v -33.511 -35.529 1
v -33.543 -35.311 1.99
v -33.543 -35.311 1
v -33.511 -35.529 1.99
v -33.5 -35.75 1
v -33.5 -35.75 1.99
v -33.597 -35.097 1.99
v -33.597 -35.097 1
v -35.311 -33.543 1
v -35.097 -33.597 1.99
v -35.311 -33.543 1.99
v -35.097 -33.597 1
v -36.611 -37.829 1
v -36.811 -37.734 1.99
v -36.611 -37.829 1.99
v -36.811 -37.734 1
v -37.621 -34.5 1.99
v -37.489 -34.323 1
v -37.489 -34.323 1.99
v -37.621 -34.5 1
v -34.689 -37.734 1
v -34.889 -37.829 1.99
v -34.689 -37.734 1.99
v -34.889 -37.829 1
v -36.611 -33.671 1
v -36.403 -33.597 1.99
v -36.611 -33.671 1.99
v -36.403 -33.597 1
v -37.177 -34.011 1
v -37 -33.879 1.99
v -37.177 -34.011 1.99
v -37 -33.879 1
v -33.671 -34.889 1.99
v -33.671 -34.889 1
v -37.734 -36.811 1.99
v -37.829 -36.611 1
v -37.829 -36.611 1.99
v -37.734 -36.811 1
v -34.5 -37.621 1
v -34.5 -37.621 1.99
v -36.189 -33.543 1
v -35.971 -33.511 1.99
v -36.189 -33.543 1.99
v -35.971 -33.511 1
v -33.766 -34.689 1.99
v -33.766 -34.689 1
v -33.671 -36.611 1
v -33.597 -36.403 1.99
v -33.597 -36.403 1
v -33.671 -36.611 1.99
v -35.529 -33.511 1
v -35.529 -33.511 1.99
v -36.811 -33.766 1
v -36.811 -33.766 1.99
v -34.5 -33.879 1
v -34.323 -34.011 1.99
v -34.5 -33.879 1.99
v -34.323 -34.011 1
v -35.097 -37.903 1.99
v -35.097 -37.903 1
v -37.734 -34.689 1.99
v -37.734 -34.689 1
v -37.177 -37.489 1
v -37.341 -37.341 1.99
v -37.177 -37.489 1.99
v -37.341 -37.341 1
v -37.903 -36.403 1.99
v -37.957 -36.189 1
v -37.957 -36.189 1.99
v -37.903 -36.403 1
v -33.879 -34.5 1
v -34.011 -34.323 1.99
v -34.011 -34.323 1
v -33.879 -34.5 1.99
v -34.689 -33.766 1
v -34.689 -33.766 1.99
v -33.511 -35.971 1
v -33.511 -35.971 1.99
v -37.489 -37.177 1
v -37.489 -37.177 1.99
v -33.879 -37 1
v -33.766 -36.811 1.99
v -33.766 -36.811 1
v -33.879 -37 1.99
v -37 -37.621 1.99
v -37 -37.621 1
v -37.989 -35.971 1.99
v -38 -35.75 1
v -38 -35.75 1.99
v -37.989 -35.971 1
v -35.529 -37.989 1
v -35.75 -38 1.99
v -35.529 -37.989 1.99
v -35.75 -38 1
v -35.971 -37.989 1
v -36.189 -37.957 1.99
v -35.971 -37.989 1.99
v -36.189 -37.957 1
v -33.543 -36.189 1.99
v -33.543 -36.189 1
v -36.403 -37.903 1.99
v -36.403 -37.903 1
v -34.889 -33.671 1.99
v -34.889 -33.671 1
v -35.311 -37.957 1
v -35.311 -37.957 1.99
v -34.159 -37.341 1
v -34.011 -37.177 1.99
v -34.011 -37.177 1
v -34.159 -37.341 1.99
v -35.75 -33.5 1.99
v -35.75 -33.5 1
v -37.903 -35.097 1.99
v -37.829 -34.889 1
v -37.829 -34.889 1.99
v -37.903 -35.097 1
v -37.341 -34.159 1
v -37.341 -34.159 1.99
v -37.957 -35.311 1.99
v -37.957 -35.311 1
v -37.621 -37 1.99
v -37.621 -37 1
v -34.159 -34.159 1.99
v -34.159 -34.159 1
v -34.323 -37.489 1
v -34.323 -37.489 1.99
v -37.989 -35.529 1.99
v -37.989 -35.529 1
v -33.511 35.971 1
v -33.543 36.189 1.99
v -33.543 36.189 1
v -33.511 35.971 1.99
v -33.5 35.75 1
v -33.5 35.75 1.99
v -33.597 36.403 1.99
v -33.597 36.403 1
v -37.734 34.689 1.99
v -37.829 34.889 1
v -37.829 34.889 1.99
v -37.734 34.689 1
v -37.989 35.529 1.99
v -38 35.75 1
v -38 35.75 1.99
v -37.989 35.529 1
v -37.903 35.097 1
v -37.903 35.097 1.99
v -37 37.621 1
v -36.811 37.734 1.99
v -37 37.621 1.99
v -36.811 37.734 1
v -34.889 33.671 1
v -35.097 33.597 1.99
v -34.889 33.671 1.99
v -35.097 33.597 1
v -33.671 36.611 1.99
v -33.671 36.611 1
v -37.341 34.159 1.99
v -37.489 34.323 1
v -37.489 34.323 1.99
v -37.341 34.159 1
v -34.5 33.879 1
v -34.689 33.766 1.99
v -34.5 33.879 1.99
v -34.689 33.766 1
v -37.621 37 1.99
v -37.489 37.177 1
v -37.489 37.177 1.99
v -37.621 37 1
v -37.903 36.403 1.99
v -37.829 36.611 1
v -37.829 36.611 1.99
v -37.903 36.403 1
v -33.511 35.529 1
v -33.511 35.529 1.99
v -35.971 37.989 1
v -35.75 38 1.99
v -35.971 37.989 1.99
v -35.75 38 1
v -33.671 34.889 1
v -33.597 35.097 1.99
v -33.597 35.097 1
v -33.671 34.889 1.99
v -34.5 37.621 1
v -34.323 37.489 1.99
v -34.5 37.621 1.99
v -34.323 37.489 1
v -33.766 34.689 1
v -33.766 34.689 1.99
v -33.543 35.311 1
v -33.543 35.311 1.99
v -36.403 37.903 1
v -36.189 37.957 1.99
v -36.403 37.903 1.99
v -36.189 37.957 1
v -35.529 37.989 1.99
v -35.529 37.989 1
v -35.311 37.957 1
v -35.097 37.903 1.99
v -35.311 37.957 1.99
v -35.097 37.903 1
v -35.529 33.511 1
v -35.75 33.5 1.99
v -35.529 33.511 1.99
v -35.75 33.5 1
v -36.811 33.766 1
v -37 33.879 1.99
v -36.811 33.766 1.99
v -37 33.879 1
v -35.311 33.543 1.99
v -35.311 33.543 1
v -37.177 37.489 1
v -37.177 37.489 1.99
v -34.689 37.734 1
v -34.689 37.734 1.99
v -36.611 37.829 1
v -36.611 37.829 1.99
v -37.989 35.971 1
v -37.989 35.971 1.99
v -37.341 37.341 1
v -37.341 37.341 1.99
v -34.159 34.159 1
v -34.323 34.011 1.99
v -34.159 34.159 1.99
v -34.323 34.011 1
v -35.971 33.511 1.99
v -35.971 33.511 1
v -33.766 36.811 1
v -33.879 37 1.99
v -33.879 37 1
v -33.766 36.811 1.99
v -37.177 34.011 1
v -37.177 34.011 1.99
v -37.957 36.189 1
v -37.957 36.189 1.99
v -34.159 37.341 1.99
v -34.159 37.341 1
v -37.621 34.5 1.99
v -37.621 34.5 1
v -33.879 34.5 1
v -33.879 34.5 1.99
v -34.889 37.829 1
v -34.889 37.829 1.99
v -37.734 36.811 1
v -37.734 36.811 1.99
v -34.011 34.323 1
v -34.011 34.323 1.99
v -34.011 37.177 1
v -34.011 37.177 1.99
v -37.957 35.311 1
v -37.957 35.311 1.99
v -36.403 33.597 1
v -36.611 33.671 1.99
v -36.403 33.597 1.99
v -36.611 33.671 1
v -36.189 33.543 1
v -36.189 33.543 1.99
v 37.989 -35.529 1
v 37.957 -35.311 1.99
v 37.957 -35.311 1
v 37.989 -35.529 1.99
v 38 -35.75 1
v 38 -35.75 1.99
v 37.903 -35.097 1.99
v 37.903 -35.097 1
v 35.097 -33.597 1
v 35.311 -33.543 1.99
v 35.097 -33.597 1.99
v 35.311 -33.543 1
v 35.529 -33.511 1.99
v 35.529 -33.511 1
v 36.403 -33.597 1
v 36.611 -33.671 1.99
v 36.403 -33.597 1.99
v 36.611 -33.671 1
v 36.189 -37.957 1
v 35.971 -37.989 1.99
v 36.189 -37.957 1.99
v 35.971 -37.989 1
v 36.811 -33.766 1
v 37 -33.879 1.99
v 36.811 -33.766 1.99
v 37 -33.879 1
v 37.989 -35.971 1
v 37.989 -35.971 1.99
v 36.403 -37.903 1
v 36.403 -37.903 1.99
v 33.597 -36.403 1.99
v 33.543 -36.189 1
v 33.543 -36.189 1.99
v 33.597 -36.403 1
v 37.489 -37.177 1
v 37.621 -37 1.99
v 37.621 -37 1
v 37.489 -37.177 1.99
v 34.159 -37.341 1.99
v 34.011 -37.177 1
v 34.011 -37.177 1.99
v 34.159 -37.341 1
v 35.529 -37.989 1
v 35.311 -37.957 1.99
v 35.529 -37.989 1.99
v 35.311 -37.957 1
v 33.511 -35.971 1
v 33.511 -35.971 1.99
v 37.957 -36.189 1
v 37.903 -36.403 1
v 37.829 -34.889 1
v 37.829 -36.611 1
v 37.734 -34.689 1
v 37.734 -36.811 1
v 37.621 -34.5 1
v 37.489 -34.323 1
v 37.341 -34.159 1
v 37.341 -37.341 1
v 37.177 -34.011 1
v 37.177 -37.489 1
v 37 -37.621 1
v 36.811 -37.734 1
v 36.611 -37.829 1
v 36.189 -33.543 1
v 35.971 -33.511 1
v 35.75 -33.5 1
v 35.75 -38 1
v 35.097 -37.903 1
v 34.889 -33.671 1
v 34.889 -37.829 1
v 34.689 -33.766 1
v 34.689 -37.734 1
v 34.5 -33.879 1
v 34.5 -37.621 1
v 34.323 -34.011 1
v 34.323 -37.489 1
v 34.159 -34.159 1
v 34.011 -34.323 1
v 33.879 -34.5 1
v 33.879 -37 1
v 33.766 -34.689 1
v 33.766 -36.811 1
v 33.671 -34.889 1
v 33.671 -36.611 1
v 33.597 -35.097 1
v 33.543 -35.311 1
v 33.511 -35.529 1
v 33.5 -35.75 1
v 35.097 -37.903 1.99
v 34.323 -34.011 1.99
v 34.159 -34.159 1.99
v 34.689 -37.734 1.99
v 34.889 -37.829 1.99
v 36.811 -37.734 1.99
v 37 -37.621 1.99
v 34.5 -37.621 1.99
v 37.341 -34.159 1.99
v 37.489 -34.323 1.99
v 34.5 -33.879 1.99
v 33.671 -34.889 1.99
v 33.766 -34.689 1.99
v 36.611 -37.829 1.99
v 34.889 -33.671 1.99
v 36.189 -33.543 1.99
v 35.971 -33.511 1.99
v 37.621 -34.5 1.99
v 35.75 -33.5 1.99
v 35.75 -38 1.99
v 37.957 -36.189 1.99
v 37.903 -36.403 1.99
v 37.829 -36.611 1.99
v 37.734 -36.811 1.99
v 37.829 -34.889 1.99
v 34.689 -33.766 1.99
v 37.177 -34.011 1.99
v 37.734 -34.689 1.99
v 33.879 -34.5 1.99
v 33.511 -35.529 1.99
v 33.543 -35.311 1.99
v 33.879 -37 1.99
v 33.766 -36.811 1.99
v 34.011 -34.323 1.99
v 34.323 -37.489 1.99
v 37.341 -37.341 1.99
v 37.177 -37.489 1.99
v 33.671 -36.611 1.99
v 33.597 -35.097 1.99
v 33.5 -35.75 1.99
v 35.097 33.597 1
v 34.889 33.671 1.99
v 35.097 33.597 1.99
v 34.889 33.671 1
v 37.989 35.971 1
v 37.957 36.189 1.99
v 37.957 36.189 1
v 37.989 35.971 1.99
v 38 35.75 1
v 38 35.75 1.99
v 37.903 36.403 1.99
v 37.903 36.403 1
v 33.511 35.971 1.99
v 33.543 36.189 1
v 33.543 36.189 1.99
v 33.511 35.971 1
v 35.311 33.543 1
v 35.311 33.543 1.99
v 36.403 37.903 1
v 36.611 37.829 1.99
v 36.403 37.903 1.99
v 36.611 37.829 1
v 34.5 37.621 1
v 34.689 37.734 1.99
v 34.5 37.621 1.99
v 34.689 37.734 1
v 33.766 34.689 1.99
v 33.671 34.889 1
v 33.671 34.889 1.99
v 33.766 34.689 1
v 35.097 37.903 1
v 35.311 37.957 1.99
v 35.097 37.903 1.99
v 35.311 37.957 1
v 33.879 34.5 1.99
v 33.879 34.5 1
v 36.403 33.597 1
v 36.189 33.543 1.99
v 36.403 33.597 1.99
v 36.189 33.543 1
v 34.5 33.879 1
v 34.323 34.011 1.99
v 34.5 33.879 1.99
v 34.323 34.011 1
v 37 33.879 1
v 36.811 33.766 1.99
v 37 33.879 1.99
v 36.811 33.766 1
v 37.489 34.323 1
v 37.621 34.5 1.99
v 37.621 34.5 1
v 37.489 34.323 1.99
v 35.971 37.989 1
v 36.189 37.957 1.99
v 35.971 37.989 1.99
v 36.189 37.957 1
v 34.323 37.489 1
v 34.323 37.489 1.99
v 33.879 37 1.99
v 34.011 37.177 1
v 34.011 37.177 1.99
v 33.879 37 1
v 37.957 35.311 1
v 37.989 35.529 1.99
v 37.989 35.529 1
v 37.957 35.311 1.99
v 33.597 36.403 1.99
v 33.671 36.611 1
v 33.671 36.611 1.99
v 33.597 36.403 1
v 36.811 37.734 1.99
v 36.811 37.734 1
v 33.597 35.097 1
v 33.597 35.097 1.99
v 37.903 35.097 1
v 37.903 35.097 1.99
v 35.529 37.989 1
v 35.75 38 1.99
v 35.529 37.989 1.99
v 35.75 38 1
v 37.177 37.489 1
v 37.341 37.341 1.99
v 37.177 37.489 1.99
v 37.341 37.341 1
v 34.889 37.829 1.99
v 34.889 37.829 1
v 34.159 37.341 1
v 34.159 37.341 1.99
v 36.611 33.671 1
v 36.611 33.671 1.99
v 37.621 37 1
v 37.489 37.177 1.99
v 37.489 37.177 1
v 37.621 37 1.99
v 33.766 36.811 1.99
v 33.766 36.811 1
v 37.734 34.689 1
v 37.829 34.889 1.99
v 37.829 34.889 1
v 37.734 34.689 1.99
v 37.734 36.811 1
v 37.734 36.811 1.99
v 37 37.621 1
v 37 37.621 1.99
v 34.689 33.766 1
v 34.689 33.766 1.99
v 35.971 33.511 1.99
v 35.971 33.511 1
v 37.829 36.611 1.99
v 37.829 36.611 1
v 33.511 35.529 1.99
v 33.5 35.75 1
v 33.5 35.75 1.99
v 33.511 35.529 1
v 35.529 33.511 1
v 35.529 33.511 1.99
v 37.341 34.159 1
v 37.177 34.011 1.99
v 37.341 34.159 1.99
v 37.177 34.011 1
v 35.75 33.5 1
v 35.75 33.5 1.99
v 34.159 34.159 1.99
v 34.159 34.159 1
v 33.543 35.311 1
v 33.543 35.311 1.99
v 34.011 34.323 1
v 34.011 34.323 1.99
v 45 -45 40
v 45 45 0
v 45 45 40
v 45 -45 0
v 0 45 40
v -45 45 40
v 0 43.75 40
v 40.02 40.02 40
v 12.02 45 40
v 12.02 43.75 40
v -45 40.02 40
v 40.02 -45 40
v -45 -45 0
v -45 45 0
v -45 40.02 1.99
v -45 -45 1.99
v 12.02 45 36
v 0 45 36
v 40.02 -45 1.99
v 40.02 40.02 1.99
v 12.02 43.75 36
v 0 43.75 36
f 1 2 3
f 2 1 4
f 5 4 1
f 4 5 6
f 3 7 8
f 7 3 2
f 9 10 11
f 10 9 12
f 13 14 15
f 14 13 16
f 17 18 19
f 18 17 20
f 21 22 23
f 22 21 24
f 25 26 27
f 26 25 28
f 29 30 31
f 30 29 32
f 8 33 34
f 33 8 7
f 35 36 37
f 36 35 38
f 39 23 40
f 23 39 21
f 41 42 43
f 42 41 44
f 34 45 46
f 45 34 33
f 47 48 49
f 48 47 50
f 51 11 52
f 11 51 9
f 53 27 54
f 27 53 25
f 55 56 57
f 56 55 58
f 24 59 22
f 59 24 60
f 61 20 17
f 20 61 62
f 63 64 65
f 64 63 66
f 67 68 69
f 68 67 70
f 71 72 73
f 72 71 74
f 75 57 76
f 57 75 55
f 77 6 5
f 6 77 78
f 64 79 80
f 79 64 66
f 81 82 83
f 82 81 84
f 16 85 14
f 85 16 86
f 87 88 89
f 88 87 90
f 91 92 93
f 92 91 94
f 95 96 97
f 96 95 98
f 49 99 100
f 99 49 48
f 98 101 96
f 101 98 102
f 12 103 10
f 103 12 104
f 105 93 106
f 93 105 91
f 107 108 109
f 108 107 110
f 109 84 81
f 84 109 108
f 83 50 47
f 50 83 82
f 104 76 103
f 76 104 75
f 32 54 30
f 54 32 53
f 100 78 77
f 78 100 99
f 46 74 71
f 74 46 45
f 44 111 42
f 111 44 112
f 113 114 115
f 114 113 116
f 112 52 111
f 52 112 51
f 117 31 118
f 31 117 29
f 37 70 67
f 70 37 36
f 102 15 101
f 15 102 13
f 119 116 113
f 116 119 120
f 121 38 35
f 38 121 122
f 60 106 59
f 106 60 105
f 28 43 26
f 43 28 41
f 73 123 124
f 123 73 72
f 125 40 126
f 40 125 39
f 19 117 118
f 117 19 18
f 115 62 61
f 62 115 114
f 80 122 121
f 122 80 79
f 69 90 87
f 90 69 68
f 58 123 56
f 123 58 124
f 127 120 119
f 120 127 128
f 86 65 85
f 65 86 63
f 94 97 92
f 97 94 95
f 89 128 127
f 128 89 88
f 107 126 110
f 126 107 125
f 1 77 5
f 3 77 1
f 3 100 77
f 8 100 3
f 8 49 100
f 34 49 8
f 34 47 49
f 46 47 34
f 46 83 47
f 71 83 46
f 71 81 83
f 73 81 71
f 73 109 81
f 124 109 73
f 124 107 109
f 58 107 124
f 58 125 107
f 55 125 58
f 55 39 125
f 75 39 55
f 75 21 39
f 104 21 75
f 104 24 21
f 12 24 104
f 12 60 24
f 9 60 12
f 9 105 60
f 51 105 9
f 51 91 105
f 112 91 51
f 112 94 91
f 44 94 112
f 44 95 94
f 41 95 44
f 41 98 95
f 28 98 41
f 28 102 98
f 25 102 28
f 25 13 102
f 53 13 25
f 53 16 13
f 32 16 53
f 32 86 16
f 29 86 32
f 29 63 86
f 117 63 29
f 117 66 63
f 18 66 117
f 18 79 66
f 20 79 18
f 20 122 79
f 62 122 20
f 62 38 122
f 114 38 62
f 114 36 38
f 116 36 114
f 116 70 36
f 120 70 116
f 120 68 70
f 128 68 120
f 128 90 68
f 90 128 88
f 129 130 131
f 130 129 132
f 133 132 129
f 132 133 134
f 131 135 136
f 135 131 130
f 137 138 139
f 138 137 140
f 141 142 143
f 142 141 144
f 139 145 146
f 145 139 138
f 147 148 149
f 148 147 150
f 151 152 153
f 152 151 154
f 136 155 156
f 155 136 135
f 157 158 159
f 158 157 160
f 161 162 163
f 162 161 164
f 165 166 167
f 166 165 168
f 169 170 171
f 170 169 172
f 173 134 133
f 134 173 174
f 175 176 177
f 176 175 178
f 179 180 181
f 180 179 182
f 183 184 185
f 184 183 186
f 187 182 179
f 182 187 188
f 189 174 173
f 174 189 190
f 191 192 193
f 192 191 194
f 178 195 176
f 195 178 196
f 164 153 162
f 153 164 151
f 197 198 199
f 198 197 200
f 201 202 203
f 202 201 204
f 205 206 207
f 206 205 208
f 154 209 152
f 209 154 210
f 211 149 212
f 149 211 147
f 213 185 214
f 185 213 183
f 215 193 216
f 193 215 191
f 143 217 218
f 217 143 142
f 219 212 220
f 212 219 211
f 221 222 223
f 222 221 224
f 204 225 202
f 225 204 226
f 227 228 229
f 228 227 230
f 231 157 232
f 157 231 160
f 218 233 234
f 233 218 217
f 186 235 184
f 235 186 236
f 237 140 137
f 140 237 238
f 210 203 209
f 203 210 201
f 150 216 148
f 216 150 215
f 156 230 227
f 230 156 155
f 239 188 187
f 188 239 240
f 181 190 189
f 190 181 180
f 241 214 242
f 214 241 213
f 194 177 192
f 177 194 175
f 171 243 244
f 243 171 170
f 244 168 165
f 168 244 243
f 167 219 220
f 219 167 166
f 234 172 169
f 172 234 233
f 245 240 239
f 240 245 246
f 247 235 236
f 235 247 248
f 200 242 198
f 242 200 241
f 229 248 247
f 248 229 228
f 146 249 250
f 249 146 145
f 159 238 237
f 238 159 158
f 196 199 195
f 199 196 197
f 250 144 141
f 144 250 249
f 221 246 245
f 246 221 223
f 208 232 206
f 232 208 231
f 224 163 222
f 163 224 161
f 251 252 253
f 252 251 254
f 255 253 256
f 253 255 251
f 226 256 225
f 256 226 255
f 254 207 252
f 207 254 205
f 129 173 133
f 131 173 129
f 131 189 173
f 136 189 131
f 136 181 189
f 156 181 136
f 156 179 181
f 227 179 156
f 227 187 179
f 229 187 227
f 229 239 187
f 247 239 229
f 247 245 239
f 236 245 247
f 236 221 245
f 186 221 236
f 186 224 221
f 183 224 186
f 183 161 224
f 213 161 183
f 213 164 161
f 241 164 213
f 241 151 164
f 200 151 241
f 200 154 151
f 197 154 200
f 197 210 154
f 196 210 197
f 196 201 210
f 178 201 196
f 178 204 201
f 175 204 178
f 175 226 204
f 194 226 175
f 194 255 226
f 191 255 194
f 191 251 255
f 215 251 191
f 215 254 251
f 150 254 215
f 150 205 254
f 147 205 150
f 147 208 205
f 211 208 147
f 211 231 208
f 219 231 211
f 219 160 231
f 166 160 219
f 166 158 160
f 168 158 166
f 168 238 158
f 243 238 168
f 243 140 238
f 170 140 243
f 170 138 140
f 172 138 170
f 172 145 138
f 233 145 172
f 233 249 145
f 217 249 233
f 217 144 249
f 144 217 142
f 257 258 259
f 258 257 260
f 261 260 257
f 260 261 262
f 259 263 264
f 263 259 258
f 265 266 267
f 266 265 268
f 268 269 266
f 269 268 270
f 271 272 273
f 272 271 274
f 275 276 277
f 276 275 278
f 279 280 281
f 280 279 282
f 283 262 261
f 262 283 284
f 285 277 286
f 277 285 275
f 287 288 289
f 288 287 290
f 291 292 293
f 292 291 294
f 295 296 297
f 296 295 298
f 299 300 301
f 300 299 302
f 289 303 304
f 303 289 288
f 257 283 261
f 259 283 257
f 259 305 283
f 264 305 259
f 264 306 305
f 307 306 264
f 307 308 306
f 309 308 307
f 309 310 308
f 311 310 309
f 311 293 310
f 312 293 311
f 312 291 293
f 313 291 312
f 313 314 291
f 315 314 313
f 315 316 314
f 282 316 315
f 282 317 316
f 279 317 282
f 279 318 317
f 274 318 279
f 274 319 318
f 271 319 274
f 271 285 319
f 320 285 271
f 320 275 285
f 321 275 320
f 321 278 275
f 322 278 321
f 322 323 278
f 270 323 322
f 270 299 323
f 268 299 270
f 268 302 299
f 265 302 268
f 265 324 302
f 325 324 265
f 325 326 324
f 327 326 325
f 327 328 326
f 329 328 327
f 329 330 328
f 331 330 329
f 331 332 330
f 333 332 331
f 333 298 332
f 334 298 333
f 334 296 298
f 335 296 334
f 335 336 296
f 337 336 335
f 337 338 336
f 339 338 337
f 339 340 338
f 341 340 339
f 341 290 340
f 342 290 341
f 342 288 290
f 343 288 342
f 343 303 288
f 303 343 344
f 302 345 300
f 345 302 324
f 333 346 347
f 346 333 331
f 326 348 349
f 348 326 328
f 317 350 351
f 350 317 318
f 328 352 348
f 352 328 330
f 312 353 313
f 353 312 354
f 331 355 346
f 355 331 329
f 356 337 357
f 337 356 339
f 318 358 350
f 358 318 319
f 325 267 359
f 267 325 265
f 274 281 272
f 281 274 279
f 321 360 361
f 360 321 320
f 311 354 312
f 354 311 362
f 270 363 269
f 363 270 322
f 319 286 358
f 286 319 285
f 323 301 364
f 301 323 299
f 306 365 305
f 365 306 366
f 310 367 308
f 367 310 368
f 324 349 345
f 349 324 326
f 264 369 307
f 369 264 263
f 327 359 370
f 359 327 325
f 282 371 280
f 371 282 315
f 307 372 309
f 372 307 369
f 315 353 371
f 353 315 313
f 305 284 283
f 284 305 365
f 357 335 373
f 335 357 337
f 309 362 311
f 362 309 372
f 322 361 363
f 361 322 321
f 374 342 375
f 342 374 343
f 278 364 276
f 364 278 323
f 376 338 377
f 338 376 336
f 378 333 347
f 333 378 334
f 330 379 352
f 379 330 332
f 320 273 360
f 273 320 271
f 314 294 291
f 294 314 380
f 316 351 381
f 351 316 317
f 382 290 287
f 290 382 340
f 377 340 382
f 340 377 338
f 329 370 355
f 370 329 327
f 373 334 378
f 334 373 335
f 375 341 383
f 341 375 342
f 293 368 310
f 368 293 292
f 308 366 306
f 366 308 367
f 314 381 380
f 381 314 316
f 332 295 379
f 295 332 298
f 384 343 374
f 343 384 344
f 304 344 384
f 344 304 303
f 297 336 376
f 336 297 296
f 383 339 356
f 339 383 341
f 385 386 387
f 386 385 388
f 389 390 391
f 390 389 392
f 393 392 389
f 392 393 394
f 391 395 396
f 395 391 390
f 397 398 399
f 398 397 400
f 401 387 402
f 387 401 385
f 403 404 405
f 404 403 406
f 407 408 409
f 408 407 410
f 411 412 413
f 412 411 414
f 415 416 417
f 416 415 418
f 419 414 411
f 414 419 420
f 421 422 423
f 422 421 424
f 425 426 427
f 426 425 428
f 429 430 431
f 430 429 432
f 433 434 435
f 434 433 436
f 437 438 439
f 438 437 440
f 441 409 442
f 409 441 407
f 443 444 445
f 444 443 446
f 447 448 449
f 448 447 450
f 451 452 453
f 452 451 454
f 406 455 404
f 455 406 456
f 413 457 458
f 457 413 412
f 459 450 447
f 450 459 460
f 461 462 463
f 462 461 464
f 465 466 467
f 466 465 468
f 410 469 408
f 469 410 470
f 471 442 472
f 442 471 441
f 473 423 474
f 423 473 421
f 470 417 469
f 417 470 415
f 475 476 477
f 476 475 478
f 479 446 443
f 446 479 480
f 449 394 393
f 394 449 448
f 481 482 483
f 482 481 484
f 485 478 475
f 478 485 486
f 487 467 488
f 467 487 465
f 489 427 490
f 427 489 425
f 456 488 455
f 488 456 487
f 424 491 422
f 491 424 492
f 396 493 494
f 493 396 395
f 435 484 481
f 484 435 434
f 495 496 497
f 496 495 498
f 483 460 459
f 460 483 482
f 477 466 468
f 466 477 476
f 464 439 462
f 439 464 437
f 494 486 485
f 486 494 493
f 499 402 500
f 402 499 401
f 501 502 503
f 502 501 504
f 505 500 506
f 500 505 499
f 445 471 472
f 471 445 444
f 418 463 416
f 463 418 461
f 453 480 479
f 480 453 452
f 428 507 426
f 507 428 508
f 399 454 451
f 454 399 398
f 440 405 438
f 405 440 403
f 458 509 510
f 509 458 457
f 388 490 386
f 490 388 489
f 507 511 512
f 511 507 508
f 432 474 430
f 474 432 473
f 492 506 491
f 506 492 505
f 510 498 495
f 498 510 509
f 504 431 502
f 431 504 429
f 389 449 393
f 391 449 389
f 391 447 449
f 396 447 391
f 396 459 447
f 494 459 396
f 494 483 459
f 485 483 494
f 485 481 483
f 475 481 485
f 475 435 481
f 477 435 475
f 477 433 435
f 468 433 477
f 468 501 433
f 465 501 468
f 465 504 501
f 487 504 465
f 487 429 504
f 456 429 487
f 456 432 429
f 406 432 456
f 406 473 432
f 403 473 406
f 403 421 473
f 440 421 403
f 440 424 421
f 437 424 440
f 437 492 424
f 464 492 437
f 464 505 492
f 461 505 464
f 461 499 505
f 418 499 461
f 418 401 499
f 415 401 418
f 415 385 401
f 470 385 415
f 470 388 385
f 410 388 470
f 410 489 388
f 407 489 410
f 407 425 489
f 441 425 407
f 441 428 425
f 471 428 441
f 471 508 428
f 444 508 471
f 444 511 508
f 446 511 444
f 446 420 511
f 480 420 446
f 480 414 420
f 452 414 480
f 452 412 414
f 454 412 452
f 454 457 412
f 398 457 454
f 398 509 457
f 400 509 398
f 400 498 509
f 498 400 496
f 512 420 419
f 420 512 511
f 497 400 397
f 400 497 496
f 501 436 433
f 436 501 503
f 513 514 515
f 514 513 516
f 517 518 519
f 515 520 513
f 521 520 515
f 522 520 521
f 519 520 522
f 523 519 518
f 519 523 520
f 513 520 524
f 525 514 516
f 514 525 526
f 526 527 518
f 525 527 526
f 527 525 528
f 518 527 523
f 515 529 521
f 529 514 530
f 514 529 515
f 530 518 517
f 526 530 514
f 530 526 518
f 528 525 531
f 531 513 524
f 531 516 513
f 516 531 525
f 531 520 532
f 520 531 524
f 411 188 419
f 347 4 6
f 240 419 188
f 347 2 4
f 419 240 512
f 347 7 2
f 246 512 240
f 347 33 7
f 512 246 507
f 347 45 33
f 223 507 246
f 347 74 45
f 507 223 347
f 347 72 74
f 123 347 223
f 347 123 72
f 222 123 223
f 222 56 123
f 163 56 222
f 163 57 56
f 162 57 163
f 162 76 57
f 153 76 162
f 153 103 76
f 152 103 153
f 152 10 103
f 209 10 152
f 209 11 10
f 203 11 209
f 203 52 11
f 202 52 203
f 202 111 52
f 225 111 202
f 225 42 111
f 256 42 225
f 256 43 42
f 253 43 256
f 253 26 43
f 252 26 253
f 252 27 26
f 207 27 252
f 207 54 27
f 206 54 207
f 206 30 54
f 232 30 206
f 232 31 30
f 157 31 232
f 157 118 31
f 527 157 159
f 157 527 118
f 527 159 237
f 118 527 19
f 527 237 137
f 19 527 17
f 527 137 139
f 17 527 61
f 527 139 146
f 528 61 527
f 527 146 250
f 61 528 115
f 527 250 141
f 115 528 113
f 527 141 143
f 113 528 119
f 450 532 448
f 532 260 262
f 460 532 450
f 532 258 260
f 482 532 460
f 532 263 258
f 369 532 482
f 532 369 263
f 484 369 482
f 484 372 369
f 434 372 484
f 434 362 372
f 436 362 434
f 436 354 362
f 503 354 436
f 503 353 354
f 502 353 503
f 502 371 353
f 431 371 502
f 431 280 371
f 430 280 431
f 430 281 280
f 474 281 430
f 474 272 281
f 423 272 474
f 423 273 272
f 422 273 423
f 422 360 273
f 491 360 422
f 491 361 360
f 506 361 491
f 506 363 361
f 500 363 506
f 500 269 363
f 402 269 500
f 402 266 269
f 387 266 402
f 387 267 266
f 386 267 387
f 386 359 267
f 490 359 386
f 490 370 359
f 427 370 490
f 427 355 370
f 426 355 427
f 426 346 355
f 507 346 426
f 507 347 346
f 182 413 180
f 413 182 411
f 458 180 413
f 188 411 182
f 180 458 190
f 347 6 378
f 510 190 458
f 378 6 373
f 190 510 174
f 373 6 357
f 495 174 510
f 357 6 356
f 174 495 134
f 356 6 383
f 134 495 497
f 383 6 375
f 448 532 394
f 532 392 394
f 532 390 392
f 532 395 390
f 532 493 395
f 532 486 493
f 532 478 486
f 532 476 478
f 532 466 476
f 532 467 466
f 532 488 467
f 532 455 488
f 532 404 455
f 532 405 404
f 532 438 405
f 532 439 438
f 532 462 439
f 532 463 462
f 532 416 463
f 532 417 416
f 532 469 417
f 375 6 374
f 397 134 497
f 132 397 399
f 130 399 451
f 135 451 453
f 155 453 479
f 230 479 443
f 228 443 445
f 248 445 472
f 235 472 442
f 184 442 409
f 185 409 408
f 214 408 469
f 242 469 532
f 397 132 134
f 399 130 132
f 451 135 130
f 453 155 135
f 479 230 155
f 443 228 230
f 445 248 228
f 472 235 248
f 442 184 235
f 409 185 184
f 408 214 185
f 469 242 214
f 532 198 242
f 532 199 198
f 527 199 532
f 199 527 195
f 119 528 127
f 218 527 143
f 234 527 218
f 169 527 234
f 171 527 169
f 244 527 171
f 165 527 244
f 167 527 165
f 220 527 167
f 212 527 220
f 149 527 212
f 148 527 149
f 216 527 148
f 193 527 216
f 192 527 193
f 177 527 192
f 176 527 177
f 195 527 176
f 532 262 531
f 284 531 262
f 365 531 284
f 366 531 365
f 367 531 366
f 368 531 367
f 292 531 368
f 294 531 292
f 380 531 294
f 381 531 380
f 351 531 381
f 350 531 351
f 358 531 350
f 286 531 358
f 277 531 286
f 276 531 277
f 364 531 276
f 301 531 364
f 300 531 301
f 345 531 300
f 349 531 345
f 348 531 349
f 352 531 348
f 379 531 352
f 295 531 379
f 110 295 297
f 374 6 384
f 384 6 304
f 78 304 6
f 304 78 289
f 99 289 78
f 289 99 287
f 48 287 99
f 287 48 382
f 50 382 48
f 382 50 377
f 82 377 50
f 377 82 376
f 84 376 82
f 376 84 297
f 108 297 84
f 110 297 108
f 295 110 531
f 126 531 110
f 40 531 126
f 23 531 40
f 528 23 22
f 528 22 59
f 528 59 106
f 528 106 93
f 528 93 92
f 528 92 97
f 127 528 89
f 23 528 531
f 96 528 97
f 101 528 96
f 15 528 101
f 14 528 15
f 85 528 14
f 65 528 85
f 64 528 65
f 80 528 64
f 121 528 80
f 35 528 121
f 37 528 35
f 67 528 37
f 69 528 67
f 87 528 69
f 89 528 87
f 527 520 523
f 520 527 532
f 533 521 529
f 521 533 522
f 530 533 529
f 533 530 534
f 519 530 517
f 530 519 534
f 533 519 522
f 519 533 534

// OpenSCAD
$fn = 64;

// Dimensions
outer_width = 90;
outer_height = 90;
total_height = 40;
plate_thickness = 2;
wall_thickness = 2.5;
hole_diameter = 4.5;
hole_pattern_size = 71.5;
notch_width = 12;
notch_depth = 8;

// Calculated positions
half_outer = outer_width / 2;
half_inner = (outer_width - 2 * wall_thickness) / 2;
hole_offset = hole_pattern_size / 2;
notch_center_y = half_outer - wall_thickness / 2;
notch_center_z = total_height - notch_depth / 2;

difference() {
    // Main Body - centred at origin in X and Y
    translate([-half_outer, -half_outer, 0])
        cube([outer_width, outer_height, total_height]);

    // Inner Cavity Cut
    // Extends past Z=2 (plate) and Z=40 (open top)
    // Extends past X=±42.5 and Y=±42.5 (inner walls)
    translate([-half_outer, -half_outer, 1.99])
        cube([outer_width - 2 * wall_thickness + 0.02, 
              outer_height - 2 * wall_thickness + 0.02, 
              total_height - 2 + 0.02]);

    // Screw Holes - 4 holes on 71.5 mm square pattern centred on plate
    for(i = [-1, 1], j = [-1, 1]) {
        translate([i * hole_offset, j * hole_offset, 1])
            cylinder(d = hole_diameter, h = plate_thickness + 0.02);
    }

    // Cable Notch Cut
    // Located in the front wall (Y = +42.5 to +45)
    // Centred along the wall (X = 0)
    // Depth 8mm from open edge (Z = 32 to 40)
    translate([0, notch_center_y, notch_center_z])
        cube([notch_width + 0.02, wall_thickness + 0.02, notch_depth + 0.02]);
}
